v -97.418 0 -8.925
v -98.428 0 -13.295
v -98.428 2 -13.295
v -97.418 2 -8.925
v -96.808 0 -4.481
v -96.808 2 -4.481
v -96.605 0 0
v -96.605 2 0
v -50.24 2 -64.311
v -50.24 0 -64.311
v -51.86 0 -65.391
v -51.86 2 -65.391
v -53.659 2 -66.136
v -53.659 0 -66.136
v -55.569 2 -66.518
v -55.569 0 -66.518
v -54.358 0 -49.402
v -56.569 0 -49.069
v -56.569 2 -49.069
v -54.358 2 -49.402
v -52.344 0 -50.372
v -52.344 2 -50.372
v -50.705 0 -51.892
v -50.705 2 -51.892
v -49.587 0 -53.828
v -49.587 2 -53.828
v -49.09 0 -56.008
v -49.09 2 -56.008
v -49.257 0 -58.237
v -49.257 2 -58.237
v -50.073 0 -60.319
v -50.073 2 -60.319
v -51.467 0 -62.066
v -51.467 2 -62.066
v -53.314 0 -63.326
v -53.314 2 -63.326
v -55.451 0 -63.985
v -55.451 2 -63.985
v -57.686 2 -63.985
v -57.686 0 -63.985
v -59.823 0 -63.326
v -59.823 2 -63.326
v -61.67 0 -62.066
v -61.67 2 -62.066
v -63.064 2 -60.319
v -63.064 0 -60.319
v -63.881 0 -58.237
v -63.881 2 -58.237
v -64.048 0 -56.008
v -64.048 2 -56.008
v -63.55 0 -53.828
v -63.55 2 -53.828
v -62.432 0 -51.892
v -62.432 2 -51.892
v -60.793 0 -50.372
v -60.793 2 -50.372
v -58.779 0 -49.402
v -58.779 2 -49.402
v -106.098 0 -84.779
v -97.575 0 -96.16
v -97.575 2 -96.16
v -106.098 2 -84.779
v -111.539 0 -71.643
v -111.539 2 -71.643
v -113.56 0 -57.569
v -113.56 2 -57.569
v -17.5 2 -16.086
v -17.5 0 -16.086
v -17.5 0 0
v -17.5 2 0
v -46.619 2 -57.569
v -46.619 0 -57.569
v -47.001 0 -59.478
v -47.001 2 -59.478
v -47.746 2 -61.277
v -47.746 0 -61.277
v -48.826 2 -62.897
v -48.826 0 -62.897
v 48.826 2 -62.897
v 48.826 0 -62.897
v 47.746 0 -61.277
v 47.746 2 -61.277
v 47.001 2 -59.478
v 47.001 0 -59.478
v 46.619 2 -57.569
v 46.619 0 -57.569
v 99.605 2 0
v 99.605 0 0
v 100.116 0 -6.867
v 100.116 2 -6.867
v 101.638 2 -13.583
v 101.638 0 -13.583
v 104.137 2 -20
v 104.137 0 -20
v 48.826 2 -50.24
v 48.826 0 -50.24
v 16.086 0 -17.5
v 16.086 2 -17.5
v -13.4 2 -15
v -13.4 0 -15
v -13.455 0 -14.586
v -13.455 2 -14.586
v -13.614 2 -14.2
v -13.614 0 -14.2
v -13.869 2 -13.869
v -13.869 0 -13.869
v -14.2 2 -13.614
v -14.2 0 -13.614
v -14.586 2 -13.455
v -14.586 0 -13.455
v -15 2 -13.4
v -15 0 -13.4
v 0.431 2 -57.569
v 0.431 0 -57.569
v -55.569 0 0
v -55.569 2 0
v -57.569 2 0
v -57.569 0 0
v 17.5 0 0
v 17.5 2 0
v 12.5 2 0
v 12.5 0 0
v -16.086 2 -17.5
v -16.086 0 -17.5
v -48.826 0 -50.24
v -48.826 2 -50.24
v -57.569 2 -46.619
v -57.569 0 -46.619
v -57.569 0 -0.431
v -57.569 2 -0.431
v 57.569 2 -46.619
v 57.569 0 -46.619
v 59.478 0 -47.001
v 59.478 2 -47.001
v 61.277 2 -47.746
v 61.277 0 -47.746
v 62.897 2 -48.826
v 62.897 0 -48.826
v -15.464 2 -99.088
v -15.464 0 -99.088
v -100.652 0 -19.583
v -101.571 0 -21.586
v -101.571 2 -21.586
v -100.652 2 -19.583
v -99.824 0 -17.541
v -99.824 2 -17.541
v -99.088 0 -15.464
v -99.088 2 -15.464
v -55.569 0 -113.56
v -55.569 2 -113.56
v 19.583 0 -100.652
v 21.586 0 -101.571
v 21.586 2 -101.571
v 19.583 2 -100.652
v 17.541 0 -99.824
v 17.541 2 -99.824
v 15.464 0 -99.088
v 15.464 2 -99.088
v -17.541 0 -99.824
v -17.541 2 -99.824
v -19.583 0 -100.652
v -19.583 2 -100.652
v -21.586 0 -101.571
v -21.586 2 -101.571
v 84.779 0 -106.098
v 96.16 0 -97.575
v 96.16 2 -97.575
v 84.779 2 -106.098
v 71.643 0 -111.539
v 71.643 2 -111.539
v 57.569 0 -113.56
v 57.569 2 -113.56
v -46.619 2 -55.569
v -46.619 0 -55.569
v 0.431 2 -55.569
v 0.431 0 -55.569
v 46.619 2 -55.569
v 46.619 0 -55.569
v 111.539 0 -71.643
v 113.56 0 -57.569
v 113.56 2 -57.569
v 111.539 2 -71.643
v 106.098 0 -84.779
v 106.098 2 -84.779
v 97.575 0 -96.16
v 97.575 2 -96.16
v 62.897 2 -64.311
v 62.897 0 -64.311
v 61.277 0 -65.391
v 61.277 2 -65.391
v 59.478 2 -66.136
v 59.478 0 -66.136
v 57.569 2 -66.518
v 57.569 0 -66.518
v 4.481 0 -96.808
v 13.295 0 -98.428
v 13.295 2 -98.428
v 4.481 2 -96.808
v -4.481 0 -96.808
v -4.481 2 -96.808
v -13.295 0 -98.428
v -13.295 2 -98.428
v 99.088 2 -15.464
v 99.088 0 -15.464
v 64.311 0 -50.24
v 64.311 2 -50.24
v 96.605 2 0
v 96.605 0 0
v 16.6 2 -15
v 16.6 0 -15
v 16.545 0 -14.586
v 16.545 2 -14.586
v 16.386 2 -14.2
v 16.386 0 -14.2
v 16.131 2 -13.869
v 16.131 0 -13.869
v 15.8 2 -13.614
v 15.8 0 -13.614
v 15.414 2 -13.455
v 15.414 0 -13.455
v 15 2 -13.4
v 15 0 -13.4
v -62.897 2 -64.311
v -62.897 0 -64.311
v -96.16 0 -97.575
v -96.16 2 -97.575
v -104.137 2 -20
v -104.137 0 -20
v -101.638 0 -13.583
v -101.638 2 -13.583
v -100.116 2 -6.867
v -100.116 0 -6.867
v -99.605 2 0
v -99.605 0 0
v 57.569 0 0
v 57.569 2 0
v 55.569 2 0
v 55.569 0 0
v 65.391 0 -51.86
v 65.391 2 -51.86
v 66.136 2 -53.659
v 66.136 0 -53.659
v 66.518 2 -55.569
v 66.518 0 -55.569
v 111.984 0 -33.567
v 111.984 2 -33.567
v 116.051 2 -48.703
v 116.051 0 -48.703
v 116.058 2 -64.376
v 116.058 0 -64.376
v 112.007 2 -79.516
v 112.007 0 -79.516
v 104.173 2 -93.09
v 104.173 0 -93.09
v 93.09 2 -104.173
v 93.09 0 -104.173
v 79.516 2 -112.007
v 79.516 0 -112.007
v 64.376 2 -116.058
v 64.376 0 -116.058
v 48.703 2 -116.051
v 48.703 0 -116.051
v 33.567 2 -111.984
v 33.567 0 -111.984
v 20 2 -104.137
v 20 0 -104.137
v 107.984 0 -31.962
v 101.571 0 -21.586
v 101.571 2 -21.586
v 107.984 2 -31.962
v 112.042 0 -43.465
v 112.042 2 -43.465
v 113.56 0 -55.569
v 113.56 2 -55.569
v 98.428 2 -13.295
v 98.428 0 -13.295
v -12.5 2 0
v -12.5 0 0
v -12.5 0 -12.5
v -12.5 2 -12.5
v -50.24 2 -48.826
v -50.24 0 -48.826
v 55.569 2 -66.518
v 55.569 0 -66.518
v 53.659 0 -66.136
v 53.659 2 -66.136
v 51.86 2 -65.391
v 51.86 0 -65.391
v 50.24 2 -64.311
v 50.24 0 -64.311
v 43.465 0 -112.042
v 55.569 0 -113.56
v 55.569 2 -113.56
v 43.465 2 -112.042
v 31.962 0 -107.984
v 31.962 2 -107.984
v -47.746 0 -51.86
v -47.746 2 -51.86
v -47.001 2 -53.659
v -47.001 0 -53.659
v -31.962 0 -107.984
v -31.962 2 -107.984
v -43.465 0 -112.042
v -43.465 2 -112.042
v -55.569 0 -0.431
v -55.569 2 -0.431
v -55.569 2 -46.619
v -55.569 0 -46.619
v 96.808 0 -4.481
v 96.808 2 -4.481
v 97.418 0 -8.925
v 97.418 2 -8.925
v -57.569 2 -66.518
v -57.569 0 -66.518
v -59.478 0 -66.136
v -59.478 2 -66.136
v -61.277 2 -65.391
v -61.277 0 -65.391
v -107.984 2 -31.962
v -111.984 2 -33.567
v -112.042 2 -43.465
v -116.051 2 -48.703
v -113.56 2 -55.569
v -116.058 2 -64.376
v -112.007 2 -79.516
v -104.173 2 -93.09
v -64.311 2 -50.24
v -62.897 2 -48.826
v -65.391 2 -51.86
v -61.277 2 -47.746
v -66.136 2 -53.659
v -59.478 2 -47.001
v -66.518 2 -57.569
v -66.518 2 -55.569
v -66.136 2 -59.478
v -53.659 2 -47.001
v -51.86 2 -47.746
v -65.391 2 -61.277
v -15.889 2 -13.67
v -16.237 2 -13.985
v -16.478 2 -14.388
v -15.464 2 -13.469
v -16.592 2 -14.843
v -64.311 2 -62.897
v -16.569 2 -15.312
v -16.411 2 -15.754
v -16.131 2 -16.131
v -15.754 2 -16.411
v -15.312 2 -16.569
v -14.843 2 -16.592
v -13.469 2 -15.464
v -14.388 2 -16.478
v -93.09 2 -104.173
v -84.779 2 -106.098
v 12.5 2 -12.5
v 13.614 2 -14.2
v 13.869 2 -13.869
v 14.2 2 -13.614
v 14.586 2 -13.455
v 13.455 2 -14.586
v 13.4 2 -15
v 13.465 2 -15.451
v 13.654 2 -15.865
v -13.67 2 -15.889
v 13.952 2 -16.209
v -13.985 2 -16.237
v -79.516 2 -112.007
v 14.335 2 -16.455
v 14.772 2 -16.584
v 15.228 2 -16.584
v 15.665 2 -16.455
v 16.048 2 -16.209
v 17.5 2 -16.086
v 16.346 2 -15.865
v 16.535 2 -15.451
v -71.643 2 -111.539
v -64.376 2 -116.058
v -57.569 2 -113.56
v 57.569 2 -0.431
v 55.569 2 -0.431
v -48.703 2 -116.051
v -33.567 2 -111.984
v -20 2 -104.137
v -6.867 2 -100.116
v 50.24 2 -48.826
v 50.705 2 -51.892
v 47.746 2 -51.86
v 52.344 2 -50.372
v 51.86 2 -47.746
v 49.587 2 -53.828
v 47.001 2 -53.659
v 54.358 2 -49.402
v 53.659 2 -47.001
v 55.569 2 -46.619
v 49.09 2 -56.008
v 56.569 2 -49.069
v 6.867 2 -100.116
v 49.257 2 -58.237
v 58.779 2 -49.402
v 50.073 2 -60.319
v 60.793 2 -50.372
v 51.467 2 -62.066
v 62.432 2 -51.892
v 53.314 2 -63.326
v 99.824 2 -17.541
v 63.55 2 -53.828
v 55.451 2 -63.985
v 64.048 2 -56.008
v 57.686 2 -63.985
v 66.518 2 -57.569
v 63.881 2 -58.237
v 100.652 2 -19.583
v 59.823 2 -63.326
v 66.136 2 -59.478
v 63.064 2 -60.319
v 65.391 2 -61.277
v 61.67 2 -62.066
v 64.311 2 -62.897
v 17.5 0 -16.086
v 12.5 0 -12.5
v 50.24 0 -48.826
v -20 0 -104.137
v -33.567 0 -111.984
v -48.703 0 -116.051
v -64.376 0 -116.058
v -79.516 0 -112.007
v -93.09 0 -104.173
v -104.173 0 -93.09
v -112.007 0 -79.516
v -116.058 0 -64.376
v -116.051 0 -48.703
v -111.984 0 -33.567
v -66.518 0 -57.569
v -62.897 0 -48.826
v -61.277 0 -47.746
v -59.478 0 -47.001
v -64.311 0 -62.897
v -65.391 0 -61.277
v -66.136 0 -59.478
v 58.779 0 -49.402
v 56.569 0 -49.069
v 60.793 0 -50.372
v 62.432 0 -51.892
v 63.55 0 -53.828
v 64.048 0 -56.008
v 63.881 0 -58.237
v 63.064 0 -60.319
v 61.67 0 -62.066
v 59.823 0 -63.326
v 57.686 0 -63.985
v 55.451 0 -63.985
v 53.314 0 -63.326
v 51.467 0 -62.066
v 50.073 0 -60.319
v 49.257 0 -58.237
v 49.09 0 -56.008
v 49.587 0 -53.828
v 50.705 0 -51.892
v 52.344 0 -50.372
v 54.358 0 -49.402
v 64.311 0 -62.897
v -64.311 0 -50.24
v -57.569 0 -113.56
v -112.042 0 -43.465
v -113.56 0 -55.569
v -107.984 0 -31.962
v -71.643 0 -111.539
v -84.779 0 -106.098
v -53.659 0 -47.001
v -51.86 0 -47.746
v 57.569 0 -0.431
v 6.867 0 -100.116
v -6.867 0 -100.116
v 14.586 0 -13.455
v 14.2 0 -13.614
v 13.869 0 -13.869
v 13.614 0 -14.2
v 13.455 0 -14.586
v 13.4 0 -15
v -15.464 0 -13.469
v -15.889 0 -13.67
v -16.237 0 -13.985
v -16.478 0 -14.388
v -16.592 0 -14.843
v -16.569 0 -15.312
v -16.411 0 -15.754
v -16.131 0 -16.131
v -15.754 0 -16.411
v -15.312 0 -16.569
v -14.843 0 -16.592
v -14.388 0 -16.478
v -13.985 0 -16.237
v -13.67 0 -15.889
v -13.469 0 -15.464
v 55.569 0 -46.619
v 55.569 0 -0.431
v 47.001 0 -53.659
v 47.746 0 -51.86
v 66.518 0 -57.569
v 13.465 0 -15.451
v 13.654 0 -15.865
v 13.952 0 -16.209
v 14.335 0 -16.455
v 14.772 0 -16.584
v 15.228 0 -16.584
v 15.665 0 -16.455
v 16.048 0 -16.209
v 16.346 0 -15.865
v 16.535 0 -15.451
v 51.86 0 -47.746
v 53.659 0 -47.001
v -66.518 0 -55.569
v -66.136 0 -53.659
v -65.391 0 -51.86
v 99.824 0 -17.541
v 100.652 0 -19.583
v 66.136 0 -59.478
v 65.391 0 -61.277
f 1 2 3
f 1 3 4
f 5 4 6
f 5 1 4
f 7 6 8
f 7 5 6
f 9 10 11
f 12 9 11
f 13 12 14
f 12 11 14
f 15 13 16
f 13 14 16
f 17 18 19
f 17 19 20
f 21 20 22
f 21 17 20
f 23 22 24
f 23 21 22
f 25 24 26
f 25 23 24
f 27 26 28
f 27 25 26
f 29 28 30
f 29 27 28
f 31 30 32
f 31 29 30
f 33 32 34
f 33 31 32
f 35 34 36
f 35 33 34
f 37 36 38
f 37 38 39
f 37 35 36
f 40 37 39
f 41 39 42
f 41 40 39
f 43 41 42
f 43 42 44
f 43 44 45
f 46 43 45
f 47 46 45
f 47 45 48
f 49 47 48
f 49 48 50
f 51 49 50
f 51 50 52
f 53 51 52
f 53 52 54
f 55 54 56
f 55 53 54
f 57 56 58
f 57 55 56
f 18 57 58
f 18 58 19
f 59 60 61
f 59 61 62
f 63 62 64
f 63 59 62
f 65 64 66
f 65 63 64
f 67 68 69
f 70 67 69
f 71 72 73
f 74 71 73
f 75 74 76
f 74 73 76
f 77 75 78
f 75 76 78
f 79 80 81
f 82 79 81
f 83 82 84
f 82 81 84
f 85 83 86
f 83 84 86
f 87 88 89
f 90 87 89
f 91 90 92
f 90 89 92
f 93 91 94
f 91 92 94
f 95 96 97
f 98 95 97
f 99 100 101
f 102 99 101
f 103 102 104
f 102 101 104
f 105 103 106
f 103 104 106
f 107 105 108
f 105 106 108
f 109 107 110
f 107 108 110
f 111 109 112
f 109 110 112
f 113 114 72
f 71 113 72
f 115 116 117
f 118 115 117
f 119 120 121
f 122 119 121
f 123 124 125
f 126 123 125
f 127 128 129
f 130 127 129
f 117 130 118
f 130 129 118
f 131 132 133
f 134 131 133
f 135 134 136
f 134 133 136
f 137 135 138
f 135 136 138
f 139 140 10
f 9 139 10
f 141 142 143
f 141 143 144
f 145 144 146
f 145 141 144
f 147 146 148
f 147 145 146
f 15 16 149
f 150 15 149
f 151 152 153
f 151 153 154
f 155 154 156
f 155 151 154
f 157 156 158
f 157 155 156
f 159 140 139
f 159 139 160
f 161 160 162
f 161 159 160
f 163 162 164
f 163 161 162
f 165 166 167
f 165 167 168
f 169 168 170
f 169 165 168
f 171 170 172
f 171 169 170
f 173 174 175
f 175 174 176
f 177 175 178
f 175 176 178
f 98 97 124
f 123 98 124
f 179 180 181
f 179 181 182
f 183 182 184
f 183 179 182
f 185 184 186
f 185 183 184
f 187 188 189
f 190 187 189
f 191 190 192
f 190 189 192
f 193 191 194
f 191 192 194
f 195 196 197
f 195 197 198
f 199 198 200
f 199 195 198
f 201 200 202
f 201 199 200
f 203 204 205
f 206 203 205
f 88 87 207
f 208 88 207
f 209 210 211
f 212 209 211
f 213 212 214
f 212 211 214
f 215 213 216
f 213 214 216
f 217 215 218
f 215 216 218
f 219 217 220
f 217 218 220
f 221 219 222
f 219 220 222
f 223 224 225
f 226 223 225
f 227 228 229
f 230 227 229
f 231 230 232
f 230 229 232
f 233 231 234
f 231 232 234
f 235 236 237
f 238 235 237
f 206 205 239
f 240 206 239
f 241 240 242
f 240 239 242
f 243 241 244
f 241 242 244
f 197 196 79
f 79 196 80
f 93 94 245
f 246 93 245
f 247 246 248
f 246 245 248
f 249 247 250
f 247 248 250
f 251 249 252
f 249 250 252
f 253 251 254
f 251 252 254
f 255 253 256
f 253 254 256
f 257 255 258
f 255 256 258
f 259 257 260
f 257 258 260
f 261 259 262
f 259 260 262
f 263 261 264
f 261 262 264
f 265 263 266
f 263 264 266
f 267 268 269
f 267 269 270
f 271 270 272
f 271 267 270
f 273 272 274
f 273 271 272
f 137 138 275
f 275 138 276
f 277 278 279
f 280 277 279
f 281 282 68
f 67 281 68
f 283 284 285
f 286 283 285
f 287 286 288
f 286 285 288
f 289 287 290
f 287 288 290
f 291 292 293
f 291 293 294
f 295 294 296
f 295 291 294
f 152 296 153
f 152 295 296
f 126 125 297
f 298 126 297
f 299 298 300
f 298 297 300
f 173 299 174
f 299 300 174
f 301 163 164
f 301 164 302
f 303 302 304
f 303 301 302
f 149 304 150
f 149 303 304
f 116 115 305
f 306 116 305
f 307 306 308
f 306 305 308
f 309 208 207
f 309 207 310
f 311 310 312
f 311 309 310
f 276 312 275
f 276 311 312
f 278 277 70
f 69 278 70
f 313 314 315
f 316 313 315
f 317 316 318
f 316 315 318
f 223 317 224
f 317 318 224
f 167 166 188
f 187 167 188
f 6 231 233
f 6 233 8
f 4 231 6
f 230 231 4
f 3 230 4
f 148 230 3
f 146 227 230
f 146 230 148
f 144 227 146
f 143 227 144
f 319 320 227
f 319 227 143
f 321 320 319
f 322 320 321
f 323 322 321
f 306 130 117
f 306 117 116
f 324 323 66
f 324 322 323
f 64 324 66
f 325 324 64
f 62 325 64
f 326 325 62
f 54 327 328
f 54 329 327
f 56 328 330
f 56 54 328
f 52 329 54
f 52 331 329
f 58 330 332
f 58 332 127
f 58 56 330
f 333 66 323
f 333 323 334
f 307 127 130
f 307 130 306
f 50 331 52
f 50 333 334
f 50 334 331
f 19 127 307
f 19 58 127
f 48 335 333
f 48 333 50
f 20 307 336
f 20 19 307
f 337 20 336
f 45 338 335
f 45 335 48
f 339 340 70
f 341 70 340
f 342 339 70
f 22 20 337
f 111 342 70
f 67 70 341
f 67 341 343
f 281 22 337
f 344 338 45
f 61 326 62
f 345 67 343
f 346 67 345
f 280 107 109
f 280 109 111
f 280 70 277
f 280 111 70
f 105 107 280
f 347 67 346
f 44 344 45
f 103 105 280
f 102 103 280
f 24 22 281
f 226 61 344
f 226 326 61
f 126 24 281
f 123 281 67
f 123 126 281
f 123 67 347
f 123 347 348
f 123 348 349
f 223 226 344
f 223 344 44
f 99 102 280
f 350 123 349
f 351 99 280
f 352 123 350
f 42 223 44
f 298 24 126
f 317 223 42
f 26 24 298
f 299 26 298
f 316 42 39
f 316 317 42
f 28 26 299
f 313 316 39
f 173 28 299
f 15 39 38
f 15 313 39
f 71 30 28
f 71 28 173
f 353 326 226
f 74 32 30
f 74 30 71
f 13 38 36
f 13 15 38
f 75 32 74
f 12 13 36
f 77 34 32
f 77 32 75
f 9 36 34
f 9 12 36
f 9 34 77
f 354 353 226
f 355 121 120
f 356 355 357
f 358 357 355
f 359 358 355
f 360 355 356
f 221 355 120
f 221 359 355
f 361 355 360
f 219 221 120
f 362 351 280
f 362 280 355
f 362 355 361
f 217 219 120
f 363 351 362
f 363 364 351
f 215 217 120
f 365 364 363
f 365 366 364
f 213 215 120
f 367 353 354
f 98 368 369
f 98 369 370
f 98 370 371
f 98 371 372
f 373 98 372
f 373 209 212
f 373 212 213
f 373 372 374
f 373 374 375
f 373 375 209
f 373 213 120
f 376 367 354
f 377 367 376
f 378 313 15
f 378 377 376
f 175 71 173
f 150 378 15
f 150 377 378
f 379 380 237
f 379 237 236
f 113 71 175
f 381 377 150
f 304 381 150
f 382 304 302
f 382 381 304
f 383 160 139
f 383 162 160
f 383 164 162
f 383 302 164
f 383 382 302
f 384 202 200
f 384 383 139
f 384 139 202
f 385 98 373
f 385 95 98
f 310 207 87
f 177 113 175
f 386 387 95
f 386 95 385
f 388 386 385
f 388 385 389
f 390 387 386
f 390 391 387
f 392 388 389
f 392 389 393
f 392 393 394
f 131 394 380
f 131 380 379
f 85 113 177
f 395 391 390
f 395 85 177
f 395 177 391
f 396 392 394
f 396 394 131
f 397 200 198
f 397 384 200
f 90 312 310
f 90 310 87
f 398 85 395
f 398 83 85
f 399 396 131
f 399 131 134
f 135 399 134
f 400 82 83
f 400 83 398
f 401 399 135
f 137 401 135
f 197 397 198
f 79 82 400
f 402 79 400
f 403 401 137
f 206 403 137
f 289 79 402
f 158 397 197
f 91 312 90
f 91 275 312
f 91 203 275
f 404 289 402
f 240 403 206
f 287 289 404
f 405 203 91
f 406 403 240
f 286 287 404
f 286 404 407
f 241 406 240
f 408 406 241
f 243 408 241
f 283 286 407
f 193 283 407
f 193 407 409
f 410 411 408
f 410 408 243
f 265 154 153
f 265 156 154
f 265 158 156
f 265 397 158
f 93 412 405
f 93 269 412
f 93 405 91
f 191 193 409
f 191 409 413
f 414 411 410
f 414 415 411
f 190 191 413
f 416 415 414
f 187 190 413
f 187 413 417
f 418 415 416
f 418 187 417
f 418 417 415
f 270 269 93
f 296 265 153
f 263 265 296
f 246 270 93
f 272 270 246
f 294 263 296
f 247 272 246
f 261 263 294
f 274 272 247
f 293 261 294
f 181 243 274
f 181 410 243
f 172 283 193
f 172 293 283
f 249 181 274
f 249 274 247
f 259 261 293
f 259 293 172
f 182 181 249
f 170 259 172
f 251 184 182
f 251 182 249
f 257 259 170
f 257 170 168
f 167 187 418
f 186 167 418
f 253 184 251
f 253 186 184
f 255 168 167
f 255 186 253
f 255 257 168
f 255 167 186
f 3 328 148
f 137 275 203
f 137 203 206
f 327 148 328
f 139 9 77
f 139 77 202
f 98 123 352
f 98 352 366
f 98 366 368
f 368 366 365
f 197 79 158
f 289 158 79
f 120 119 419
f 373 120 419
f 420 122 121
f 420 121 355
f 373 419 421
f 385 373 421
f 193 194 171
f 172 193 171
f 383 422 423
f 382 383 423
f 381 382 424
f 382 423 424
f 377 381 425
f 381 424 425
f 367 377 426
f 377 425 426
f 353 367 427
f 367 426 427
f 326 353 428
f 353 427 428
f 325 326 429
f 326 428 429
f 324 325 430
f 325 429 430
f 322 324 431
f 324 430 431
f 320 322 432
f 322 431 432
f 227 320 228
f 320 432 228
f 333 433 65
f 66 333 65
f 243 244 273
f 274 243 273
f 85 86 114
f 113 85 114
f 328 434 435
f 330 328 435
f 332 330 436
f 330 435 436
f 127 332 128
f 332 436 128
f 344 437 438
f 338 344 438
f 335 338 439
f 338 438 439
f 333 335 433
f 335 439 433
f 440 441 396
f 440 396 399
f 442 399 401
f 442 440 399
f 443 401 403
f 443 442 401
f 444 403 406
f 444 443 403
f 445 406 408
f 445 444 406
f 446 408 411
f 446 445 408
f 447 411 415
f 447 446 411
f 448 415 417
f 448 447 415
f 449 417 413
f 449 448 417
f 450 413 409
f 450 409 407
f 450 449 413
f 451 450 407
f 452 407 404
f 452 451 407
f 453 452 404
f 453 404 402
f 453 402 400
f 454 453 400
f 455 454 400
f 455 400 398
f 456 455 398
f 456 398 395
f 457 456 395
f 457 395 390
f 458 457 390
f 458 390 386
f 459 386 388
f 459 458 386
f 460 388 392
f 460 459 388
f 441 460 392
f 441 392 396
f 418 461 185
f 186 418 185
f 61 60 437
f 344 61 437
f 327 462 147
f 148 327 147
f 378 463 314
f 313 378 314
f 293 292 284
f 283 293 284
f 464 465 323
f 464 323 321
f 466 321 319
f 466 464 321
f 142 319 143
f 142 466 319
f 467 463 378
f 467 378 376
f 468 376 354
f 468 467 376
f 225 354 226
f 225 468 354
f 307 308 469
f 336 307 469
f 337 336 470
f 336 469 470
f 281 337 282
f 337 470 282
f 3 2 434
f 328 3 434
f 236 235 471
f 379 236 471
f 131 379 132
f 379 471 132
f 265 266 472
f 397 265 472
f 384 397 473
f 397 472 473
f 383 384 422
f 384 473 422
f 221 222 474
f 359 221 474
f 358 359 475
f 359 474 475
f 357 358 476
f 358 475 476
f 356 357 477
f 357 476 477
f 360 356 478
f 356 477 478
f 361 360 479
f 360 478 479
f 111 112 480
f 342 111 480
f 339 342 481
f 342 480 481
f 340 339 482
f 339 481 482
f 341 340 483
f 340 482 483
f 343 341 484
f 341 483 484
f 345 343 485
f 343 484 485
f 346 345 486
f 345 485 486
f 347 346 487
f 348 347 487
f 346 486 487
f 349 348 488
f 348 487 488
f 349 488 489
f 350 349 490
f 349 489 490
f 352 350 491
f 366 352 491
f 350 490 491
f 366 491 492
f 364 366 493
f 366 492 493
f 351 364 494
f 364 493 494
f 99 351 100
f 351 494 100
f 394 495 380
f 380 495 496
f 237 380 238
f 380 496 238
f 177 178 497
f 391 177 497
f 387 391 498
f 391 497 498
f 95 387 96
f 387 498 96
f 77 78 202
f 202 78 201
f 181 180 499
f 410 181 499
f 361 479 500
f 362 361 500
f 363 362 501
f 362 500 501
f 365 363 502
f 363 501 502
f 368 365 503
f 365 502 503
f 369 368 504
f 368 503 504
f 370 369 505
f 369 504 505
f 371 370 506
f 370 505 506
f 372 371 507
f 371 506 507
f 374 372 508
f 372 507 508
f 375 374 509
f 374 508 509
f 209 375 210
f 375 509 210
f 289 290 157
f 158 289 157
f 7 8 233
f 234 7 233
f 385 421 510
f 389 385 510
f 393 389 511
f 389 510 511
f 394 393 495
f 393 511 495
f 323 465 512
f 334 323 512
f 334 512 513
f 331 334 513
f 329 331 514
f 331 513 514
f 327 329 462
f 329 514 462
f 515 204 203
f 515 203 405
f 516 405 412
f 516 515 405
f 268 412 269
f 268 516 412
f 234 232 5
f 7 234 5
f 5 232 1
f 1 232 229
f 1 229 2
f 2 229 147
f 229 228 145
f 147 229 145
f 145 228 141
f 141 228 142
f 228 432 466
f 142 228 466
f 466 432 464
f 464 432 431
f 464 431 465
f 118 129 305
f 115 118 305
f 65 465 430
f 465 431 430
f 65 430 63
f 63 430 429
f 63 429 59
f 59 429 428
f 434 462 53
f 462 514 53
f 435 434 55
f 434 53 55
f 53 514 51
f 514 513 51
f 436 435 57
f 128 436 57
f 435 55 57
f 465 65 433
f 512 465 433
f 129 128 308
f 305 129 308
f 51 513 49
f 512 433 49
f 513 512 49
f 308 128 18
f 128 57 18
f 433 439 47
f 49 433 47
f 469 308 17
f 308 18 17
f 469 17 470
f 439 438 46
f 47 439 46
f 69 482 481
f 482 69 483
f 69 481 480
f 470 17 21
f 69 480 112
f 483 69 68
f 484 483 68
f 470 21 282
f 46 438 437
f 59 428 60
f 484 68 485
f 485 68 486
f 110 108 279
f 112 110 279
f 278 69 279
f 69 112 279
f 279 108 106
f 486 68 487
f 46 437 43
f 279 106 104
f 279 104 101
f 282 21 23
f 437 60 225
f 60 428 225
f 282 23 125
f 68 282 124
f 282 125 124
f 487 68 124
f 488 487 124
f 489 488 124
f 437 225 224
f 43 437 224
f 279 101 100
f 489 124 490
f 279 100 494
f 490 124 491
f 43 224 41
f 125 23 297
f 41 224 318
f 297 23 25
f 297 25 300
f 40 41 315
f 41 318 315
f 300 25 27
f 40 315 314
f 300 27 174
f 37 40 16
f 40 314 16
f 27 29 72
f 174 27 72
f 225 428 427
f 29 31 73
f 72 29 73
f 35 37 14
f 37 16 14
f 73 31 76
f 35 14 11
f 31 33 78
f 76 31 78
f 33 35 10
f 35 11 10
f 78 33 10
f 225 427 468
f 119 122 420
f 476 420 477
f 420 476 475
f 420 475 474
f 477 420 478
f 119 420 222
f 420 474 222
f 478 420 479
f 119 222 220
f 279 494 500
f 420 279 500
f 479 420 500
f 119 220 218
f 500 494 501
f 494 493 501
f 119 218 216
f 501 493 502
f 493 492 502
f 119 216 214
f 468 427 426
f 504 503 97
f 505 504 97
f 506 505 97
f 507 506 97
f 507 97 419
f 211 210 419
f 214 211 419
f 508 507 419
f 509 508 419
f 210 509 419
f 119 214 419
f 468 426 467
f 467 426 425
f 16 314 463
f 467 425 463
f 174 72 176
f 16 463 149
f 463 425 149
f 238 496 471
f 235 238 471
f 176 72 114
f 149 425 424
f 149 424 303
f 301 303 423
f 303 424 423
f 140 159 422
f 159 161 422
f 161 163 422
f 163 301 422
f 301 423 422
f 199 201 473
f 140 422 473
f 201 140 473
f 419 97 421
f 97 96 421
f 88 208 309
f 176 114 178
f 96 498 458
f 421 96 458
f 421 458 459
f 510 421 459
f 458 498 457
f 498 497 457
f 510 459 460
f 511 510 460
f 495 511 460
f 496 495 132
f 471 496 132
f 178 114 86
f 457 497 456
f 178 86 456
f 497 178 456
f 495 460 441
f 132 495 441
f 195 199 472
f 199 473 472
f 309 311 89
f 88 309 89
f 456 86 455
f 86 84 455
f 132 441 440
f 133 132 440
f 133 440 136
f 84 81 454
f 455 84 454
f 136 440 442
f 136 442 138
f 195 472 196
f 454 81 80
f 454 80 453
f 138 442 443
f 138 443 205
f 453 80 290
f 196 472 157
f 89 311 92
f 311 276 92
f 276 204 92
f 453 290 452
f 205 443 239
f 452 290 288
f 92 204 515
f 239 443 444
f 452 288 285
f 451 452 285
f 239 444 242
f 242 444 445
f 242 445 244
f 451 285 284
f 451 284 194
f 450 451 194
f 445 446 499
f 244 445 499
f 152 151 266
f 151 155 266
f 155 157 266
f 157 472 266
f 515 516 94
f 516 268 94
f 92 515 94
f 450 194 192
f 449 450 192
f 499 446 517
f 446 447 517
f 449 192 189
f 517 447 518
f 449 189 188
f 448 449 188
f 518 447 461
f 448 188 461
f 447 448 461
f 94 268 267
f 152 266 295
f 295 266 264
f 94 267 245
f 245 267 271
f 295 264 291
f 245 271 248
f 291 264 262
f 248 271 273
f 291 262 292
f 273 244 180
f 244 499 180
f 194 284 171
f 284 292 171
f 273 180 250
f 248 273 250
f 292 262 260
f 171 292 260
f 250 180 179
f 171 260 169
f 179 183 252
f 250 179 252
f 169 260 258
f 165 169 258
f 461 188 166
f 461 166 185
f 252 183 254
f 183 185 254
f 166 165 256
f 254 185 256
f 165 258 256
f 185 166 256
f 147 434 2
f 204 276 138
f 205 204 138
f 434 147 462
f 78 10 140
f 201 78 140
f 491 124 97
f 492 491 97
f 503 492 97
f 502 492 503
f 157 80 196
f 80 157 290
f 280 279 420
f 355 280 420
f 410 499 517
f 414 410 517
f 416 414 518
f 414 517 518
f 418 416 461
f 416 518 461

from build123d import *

# Parameters (mm, degrees)
BOSS_EXTRUDE1_DEPTH = 2
BOSS_EXTRUDE3_START = -2
SKETCH2_R           = 7.5
SKETCH2_R_2         = 7.500000001
SKETCH2_W           = 25
SKETCH2_H           = 25
SKETCH2_R_3         = 7.499999999
BOSS_EXTRUDE3_DEPTH = 2
CUT_EXTRUDE1_DEPTH  = 140


with BuildPart() as part:
    # Sketch1 → Boss-Extrude1 (new body)
    with BuildSketch(Plane(origin=(0, 0, 0), x_dir=(1, 0, 0), z_dir=(0, 1, 0))):
        with BuildLine():
            ThreePointArc((-20, -104.136827095), (0, -99.604797561), (20, -104.136827095))
            ThreePointArc((20, -104.136827095), (98.994949366, -98.994949366), (104.136827095, -20))
            ThreePointArc((104.136827095, -20), (99.604797561, 0), (104.136827095, 20))
            ThreePointArc((104.136827095, 20), (98.994949366, 98.994949366), (20, 104.136827095))
            ThreePointArc((20, 104.136827095), (0, 99.604797561), (-20, 104.136827095))
            ThreePointArc((-20, 104.136827095), (-98.994949366, 98.994949366), (-104.136827095, 20))
            ThreePointArc((-104.136827095, 20), (-99.604797561, 0), (-104.136827095, -20))
            ThreePointArc((-104.136827095, -20), (-98.994949366, -98.994949366), (-20, -104.136827095))
        make_face()
        with BuildLine():
            ThreePointArc((21.585746938, 101.570809271), (0, 96.604797561), (-21.585746938, 101.570809271))
            ThreePointArc((-21.585746938, 101.570809271), (-96.873629023, 96.873629023), (-101.570809271, 21.585746938))
            ThreePointArc((-101.570809271, 21.585746938), (-96.604797561, 0), (-101.570809271, -21.585746938))
            ThreePointArc((-101.570809271, -21.585746938), (-96.873629023, -96.873629023), (-21.585746938, -101.570809271))
            ThreePointArc((-21.585746938, -101.570809271), (0, -96.604797561), (21.585746938, -101.570809271))
            ThreePointArc((21.585746938, -101.570809271), (96.873629023, -96.873629023), (101.570809271, -21.585746938))
            ThreePointArc((101.570809271, -21.585746938), (96.604797561, 0), (101.570809271, 21.585746938))
            ThreePointArc((101.570809271, 21.585746938), (96.873629023, 96.873629023), (21.585746938, 101.570809271))
        make_face(mode=Mode.SUBTRACT)
    extrude(amount=BOSS_EXTRUDE1_DEPTH)

    # Sketch2 → Boss-Extrude3 (add)
    with BuildSketch(Plane(origin=(0, 2, 0), x_dir=(1, 0, 0), z_dir=(0, 1, 0)).offset(BOSS_EXTRUDE3_START)):
        with BuildLine():
            ThreePointArc((-96.873629023, 96.873629023), (-97.225645195, 96.518511206), (-97.574532635, 96.160319073))
            Line((-97.574532635, 96.160319073), (-64.311272916, 62.897059353))
            ThreePointArc((-64.311272916, 62.897059353), (-65.80733782, 60.395376819), (-66.518416866, 57.568542495))
            Line((-66.518416866, 57.568542495), (-113.55976989, 57.568542495))
            ThreePointArc((-113.55976989, 57.568542495), (-113.568542495, 56.568542495), (-113.55976989, 55.568542495))
            Line((-113.55976989, 55.568542495), (-66.518416866, 55.568542495))
            ThreePointArc((-66.518416866, 55.568542495), (-65.80733782, 52.741708171), (-64.311272916, 50.240025637))
            Line((-64.311272916, 50.240025637), (-99.087660161, 15.463638392))
            ThreePointArc((-99.087660161, 15.463638392), (-98.745220484, 14.383211249), (-98.427659658, 13.29521177))
            Line((-98.427659658, 13.29521177), (-62.897059354, 48.825812074))
            ThreePointArc((-62.897059354, 48.825812074), (-60.395376819, 47.32974717), (-57.568542495, 46.618668124))
            Line((-57.568542495, 46.618668124), (-57.568542495, 0.431457505))
            Line((-57.568542494, 0.431457505), (-57.568542494, -46.568542495))
            Line((-57.568542495, -46.568542495), (-57.568542495, -46.618668125))
            ThreePointArc((-57.568542495, -46.618668125), (-60.395376818, -47.329747171), (-62.897059353, -48.825812075))
            Line((-62.897059353, -48.825812075), (-98.427659658, -13.29521177))
            ThreePointArc((-98.427659658, -13.29521177), (-98.745220484, -14.383211249), (-99.087660161, -15.463638392))
            Line((-99.087660161, -15.463638392), (-64.311272915, -50.240025637))
            ThreePointArc((-64.311272915, -50.240025637), (-65.80733782, -52.741708172), (-66.518416866, -55.568542496))
            Line((-66.518416866, -55.568542496), (-113.55976989, -55.568542496))
            ThreePointArc((-113.55976989, -55.568542496), (-113.568542495, -56.568542496), (-113.55976989, -57.568542496))
            Line((-113.55976989, -57.568542496), (-66.518416866, -57.568542496))
            ThreePointArc((-66.518416866, -57.568542496), (-65.80733782, -60.395376819), (-64.311272916, -62.897059354))
            Line((-64.311272916, -62.897059354), (-97.574532635, -96.160319074))
            ThreePointArc((-97.574532635, -96.160319074), (-96.873629022, -96.873629023), (-96.160319072, -97.574532636))
            Line((-96.160319072, -97.574532636), (-62.897059353, -64.311272917))
            ThreePointArc((-62.897059353, -64.311272917), (-60.395376818, -65.807337821), (-57.568542495, -66.518416867))
            Line((-57.568542495, -66.518416867), (-57.568542495, -113.55976989))
            ThreePointArc((-57.568542495, -113.55976989), (-56.568542495, -113.568542495), (-55.568542495, -113.55976989))
            Line((-55.568542495, -113.55976989), (-55.568542495, -66.518416867))
            ThreePointArc((-55.568542495, -66.518416867), (-52.741708171, -65.807337821), (-50.240025636, -64.311272917))
            Line((-50.240025636, -64.311272917), (-15.463638392, -99.087660161))
            ThreePointArc((-15.463638392, -99.087660161), (-14.383211249, -98.745220484), (-13.295211771, -98.427659658))
            Line((-13.295211771, -98.427659658), (-48.825812074, -62.897059354))
            ThreePointArc((-48.825812074, -62.897059354), (-47.329747169, -60.395376819), (-46.618668124, -57.568542495))
            Line((-46.618668124, -57.568542495), (-46.568542618, -57.568542495))
            Line((-46.568542618, -57.568542496), (0.431457381, -57.568542496))
            Line((0.431457381, -57.568542495), (46.618668125, -57.568542495))
            ThreePointArc((46.618668125, -57.568542495), (47.329747171, -60.395376819), (48.825812075, -62.897059354))
            Line((48.825812075, -62.897059354), (13.295211771, -98.427659658))
            ThreePointArc((13.295211771, -98.427659658), (14.38321125, -98.745220484), (15.463638393, -99.087660161))
            Line((15.463638393, -99.087660161), (50.240025637, -64.311272916))
            ThreePointArc((50.240025637, -64.311272916), (52.741708172, -65.807337821), (55.568542496, -66.518416867))
            Line((55.568542496, -66.518416867), (55.568542496, -113.55976989))
            ThreePointArc((55.568542496, -113.55976989), (56.568542496, -113.568542495), (57.568542496, -113.55976989))
            Line((57.568542496, -113.55976989), (57.568542496, -66.518416867))
            ThreePointArc((57.568542496, -66.518416867), (60.39537682, -65.807337821), (62.897059355, -64.311272916))
            Line((62.897059355, -64.311272916), (96.160319073, -97.574532635))
            ThreePointArc((96.160319073, -97.574532635), (96.873629023, -96.873629022), (97.574532636, -96.160319073))
            Line((97.574532636, -96.160319073), (64.311272917, -62.897059354))
            ThreePointArc((64.311272917, -62.897059354), (65.807337821, -60.395376819), (66.518416867, -57.568542496))
            Line((66.518416867, -57.568542496), (113.55976989, -57.568542496))
            ThreePointArc((113.55976989, -57.568542496), (113.568542495, -56.568542496), (113.55976989, -55.568542496))
            Line((113.55976989, -55.568542496), (66.518416867, -55.568542496))
            ThreePointArc((66.518416867, -55.568542496), (65.807337821, -52.741708172), (64.311272917, -50.240025637))
            Line((64.311272917, -50.240025637), (99.087660161, -15.463638393))
            ThreePointArc((99.087660161, -15.463638393), (98.745220484, -14.38321125), (98.427659658, -13.295211771))
            Line((98.427659658, -13.295211771), (62.897059355, -48.825812075))
            ThreePointArc((62.897059355, -48.825812075), (60.39537682, -47.32974717), (57.568542495, -46.618668124))
            Line((57.568542495, -46.618668124), (57.568542495, -46.568542603))
            Line((57.568542496, -46.568542603), (57.568542496, 0.431457382))
            Line((57.568542495, 0.431457382), (57.568542495, 46.618668124))
            ThreePointArc((57.568542495, 46.618668124), (60.395376819, 47.32974717), (62.897059354, 48.825812074))
            Line((62.897059354, 48.825812074), (98.427659658, 13.295211771))
            ThreePointArc((98.427659658, 13.295211771), (98.745220484, 14.383211249), (99.087660161, 15.463638392))
            Line((99.087660161, 15.463638392), (64.311272917, 50.240025636))
            ThreePointArc((64.311272917, 50.240025636), (65.807337821, 52.741708171), (66.518416867, 55.568542495))
            Line((66.518416867, 55.568542495), (113.55976989, 55.568542495))
            ThreePointArc((113.55976989, 55.568542495), (113.568542495, 56.568542495), (113.55976989, 57.568542495))
            Line((113.55976989, 57.568542495), (66.518416867, 57.568542495))
            ThreePointArc((66.518416867, 57.568542495), (65.807337821, 60.395376819), (64.311272917, 62.897059354))
            Line((64.311272917, 62.897059354), (97.574532636, 96.160319073))
            ThreePointArc((97.574532636, 96.160319073), (96.873629023, 96.873629022), (96.160319073, 97.574532635))
            Line((96.160319073, 97.574532635), (62.897059354, 64.311272916))
            ThreePointArc((62.897059354, 64.311272916), (60.395376819, 65.80733782), (57.568542496, 66.518416866))
            Line((57.568542496, 66.518416866), (57.568542496, 113.55976989))
            ThreePointArc((57.568542496, 113.55976989), (56.568542496, 113.568542495), (55.568542496, 113.55976989))
            Line((55.568542496, 113.55976989), (55.568542496, 66.518416866))
            ThreePointArc((55.568542496, 66.518416866), (52.741708172, 65.80733782), (50.240025637, 64.311272916))
            Line((50.240025637, 64.311272916), (15.463638393, 99.087660161))
            ThreePointArc((15.463638393, 99.087660161), (14.38321125, 98.745220484), (13.295211771, 98.427659658))
            Line((13.295211771, 98.427659658), (48.825812075, 62.897059354))
            ThreePointArc((48.825812075, 62.897059354), (47.329747171, 60.395376819), (46.618668125, 57.568542496))
            Line((46.618668125, 57.568542496), (0.431457505, 57.568542496))
            Line((0.431457505, 57.568542495), (-46.568542493, 57.568542495))
            Line((-46.568542493, 57.568542495), (-46.618668124, 57.568542495))
            ThreePointArc((-46.618668124, 57.568542495), (-47.32974717, 60.395376818), (-48.825812074, 62.897059353))
            Line((-48.825812074, 62.897059353), (-13.29521177, 98.427659657))
            ThreePointArc((-13.29521177, 98.427659657), (-14.383211248, 98.745220484), (-15.463638391, 99.087660161))
            Line((-15.463638391, 99.087660161), (-50.240025636, 64.311272916))
            ThreePointArc((-50.240025636, 64.311272916), (-52.741708171, 65.80733782), (-55.568542495, 66.518416866))
            Line((-55.568542495, 66.518416866), (-55.568542495, 113.55976989))
            ThreePointArc((-55.568542495, 113.55976989), (-56.568542495, 113.568542495), (-57.568542495, 113.55976989))
            Line((-57.568542495, 113.55976989), (-57.568542495, 66.518416866))
            ThreePointArc((-57.568542495, 66.518416866), (-60.395376819, 65.80733782), (-62.897059353, 64.311272916))
            Line((-62.897059353, 64.311272916), (-96.160319073, 97.574532635))
            ThreePointArc((-96.160319073, 97.574532635), (-96.518511206, 97.225645195), (-96.873629023, 96.873629023))
        make_face()
        with Locations(Location((-56.568542495, -56.568542496, 0), (0, 0, 270))):
            Circle(SKETCH2_R, mode=Mode.SUBTRACT)
        with BuildLine():
            Line((-17.5, 16.085786437), (-17.5, -16.085786439))
            Line((-17.5, -16.085786439), (-50.240025636, -48.825812075))
            ThreePointArc((-50.240025636, -48.825812075), (-52.741708171, -47.329747171), (-55.568542495, -46.618668125))
            Line((-55.568542495, -46.618668125), (-55.568542495, -46.568542494))
            Line((-55.568542494, -46.568542494), (-55.568542494, 0.431457505))
            Line((-55.568542495, 0.431457505), (-55.568542495, 46.618668124))
            ThreePointArc((-55.568542495, 46.618668124), (-52.741708172, 47.32974717), (-50.240025637, 48.825812074))
            Line((-50.240025637, 48.825812074), (-17.5, 16.085786437))
        make_face(mode=Mode.SUBTRACT)
        with BuildLine():
            ThreePointArc((-15, -13.4), (-13.86862915, -13.86862915), (-13.4, -15))
            ThreePointArc((-13.4, -15), (-16.13137085, -16.13137085), (-15, -13.4))
        make_face(mode=Mode.SUBTRACT)
        with BuildLine():
            Line((-16.085786436, -17.5), (16.085786439, -17.5))
            Line((16.085786439, -17.5), (48.825812075, -50.240025637))
            ThreePointArc((48.825812075, -50.240025637), (47.329747171, -52.741708172), (46.618668125, -55.568542495))
            Line((46.618668125, -55.568542495), (0.431457395, -55.568542495))
            Line((0.431457395, -55.568542496), (-46.568542604, -55.568542496))
            Line((-46.568542604, -55.568542495), (-46.618668124, -55.568542495))
            ThreePointArc((-46.618668124, -55.568542495), (-47.32974717, -52.741708172), (-48.825812073, -50.240025638))
            Line((-48.825812073, -50.240025638), (-16.085786436, -17.5))
        make_face(mode=Mode.SUBTRACT)
        with Locations(Location((56.568542496, -56.568542497, 0), (0, 0, 270))):
            Circle(SKETCH2_R_2, mode=Mode.SUBTRACT)
        with BuildLine():
            ThreePointArc((16.6, -15), (15, -16.6), (13.4, -15))
            ThreePointArc((13.4, -15), (13.86862915, -13.86862915), (15, -13.4))
            ThreePointArc((15, -13.4), (16.13137085, -13.86862915), (16.6, -15))
        make_face(mode=Mode.SUBTRACT)
        Rectangle(SKETCH2_W, SKETCH2_H, mode=Mode.SUBTRACT)
        with BuildLine():
            ThreePointArc((-15, 13.4), (-16.13137085, 16.13137085), (-13.4, 15))
            ThreePointArc((-13.4, 15), (-13.86862915, 13.86862915), (-15, 13.4))
        make_face(mode=Mode.SUBTRACT)
        with Locations(Location((-56.568542494, 56.568542495, 0), (0, 0, 270))):
            Circle(SKETCH2_R_3, mode=Mode.SUBTRACT)
        with BuildLine():
            ThreePointArc((16.6, 15), (16.13137085, 13.86862915), (15, 13.4))
            ThreePointArc((15, 13.4), (13.86862915, 13.86862915), (13.4, 15))
            ThreePointArc((13.4, 15), (15, 16.6), (16.6, 15))
        make_face(mode=Mode.SUBTRACT)
        with BuildLine():
            Line((50.240025638, -48.825812074), (17.5, -16.085786437))
            Line((17.5, -16.085786437), (17.5, 16.085786438))
            Line((17.5, 16.085786438), (50.240025637, 48.825812075))
            ThreePointArc((50.240025637, 48.825812075), (52.741708172, 47.32974717), (55.568542495, 46.618668124))
            Line((55.568542495, 46.618668124), (55.568542495, 0.431457395))
            Line((55.568542496, 0.431457395), (55.568542496, -46.56854259))
            Line((55.568542495, -46.56854259), (55.568542495, -46.618668124))
            ThreePointArc((55.568542495, -46.618668124), (52.741708172, -47.32974717), (50.240025638, -48.825812074))
        make_face(mode=Mode.SUBTRACT)
        with BuildLine():
            Line((48.825812075, 50.240025637), (16.085786438, 17.5))
            Line((16.085786438, 17.5), (-16.085786438, 17.5))
            Line((-16.085786438, 17.5), (-48.825812074, 50.240025636))
            ThreePointArc((-48.825812074, 50.240025636), (-47.32974717, 52.741708171), (-46.618668124, 55.568542495))
            Line((-46.618668124, 55.568542495), (-46.568542493, 55.568542495))
            Line((-46.568542493, 55.568542495), (0.431457505, 55.568542495))
            Line((0.431457505, 55.568542496), (46.618668125, 55.568542496))
            ThreePointArc((46.618668125, 55.568542496), (47.329747171, 52.741708172), (48.825812075, 50.240025637))
        make_face(mode=Mode.SUBTRACT)
        with Locations(Location((56.568542496, 56.568542494, 0), (0, 0, 270))):
            Circle(SKETCH2_R_2, mode=Mode.SUBTRACT)
    extrude(amount=BOSS_EXTRUDE3_DEPTH)

    # Sketch3 → Cut-Extrude1 (cut, symmetric)
    with BuildSketch(Plane(origin=(0, 2, 0), x_dir=(1, 0, 0), z_dir=(0, 1, 0))):
        Polygon((0, 0), (161.210858438, 0), (161.210858438, -128.045511529), (-148.172849587, -128.045511529), (-148.172849587, -116.600102678), (-171.421336318, 0), align=None)
    extrude(amount=CUT_EXTRUDE1_DEPTH, both=True, mode=Mode.SUBTRACT)


solid = part.part
